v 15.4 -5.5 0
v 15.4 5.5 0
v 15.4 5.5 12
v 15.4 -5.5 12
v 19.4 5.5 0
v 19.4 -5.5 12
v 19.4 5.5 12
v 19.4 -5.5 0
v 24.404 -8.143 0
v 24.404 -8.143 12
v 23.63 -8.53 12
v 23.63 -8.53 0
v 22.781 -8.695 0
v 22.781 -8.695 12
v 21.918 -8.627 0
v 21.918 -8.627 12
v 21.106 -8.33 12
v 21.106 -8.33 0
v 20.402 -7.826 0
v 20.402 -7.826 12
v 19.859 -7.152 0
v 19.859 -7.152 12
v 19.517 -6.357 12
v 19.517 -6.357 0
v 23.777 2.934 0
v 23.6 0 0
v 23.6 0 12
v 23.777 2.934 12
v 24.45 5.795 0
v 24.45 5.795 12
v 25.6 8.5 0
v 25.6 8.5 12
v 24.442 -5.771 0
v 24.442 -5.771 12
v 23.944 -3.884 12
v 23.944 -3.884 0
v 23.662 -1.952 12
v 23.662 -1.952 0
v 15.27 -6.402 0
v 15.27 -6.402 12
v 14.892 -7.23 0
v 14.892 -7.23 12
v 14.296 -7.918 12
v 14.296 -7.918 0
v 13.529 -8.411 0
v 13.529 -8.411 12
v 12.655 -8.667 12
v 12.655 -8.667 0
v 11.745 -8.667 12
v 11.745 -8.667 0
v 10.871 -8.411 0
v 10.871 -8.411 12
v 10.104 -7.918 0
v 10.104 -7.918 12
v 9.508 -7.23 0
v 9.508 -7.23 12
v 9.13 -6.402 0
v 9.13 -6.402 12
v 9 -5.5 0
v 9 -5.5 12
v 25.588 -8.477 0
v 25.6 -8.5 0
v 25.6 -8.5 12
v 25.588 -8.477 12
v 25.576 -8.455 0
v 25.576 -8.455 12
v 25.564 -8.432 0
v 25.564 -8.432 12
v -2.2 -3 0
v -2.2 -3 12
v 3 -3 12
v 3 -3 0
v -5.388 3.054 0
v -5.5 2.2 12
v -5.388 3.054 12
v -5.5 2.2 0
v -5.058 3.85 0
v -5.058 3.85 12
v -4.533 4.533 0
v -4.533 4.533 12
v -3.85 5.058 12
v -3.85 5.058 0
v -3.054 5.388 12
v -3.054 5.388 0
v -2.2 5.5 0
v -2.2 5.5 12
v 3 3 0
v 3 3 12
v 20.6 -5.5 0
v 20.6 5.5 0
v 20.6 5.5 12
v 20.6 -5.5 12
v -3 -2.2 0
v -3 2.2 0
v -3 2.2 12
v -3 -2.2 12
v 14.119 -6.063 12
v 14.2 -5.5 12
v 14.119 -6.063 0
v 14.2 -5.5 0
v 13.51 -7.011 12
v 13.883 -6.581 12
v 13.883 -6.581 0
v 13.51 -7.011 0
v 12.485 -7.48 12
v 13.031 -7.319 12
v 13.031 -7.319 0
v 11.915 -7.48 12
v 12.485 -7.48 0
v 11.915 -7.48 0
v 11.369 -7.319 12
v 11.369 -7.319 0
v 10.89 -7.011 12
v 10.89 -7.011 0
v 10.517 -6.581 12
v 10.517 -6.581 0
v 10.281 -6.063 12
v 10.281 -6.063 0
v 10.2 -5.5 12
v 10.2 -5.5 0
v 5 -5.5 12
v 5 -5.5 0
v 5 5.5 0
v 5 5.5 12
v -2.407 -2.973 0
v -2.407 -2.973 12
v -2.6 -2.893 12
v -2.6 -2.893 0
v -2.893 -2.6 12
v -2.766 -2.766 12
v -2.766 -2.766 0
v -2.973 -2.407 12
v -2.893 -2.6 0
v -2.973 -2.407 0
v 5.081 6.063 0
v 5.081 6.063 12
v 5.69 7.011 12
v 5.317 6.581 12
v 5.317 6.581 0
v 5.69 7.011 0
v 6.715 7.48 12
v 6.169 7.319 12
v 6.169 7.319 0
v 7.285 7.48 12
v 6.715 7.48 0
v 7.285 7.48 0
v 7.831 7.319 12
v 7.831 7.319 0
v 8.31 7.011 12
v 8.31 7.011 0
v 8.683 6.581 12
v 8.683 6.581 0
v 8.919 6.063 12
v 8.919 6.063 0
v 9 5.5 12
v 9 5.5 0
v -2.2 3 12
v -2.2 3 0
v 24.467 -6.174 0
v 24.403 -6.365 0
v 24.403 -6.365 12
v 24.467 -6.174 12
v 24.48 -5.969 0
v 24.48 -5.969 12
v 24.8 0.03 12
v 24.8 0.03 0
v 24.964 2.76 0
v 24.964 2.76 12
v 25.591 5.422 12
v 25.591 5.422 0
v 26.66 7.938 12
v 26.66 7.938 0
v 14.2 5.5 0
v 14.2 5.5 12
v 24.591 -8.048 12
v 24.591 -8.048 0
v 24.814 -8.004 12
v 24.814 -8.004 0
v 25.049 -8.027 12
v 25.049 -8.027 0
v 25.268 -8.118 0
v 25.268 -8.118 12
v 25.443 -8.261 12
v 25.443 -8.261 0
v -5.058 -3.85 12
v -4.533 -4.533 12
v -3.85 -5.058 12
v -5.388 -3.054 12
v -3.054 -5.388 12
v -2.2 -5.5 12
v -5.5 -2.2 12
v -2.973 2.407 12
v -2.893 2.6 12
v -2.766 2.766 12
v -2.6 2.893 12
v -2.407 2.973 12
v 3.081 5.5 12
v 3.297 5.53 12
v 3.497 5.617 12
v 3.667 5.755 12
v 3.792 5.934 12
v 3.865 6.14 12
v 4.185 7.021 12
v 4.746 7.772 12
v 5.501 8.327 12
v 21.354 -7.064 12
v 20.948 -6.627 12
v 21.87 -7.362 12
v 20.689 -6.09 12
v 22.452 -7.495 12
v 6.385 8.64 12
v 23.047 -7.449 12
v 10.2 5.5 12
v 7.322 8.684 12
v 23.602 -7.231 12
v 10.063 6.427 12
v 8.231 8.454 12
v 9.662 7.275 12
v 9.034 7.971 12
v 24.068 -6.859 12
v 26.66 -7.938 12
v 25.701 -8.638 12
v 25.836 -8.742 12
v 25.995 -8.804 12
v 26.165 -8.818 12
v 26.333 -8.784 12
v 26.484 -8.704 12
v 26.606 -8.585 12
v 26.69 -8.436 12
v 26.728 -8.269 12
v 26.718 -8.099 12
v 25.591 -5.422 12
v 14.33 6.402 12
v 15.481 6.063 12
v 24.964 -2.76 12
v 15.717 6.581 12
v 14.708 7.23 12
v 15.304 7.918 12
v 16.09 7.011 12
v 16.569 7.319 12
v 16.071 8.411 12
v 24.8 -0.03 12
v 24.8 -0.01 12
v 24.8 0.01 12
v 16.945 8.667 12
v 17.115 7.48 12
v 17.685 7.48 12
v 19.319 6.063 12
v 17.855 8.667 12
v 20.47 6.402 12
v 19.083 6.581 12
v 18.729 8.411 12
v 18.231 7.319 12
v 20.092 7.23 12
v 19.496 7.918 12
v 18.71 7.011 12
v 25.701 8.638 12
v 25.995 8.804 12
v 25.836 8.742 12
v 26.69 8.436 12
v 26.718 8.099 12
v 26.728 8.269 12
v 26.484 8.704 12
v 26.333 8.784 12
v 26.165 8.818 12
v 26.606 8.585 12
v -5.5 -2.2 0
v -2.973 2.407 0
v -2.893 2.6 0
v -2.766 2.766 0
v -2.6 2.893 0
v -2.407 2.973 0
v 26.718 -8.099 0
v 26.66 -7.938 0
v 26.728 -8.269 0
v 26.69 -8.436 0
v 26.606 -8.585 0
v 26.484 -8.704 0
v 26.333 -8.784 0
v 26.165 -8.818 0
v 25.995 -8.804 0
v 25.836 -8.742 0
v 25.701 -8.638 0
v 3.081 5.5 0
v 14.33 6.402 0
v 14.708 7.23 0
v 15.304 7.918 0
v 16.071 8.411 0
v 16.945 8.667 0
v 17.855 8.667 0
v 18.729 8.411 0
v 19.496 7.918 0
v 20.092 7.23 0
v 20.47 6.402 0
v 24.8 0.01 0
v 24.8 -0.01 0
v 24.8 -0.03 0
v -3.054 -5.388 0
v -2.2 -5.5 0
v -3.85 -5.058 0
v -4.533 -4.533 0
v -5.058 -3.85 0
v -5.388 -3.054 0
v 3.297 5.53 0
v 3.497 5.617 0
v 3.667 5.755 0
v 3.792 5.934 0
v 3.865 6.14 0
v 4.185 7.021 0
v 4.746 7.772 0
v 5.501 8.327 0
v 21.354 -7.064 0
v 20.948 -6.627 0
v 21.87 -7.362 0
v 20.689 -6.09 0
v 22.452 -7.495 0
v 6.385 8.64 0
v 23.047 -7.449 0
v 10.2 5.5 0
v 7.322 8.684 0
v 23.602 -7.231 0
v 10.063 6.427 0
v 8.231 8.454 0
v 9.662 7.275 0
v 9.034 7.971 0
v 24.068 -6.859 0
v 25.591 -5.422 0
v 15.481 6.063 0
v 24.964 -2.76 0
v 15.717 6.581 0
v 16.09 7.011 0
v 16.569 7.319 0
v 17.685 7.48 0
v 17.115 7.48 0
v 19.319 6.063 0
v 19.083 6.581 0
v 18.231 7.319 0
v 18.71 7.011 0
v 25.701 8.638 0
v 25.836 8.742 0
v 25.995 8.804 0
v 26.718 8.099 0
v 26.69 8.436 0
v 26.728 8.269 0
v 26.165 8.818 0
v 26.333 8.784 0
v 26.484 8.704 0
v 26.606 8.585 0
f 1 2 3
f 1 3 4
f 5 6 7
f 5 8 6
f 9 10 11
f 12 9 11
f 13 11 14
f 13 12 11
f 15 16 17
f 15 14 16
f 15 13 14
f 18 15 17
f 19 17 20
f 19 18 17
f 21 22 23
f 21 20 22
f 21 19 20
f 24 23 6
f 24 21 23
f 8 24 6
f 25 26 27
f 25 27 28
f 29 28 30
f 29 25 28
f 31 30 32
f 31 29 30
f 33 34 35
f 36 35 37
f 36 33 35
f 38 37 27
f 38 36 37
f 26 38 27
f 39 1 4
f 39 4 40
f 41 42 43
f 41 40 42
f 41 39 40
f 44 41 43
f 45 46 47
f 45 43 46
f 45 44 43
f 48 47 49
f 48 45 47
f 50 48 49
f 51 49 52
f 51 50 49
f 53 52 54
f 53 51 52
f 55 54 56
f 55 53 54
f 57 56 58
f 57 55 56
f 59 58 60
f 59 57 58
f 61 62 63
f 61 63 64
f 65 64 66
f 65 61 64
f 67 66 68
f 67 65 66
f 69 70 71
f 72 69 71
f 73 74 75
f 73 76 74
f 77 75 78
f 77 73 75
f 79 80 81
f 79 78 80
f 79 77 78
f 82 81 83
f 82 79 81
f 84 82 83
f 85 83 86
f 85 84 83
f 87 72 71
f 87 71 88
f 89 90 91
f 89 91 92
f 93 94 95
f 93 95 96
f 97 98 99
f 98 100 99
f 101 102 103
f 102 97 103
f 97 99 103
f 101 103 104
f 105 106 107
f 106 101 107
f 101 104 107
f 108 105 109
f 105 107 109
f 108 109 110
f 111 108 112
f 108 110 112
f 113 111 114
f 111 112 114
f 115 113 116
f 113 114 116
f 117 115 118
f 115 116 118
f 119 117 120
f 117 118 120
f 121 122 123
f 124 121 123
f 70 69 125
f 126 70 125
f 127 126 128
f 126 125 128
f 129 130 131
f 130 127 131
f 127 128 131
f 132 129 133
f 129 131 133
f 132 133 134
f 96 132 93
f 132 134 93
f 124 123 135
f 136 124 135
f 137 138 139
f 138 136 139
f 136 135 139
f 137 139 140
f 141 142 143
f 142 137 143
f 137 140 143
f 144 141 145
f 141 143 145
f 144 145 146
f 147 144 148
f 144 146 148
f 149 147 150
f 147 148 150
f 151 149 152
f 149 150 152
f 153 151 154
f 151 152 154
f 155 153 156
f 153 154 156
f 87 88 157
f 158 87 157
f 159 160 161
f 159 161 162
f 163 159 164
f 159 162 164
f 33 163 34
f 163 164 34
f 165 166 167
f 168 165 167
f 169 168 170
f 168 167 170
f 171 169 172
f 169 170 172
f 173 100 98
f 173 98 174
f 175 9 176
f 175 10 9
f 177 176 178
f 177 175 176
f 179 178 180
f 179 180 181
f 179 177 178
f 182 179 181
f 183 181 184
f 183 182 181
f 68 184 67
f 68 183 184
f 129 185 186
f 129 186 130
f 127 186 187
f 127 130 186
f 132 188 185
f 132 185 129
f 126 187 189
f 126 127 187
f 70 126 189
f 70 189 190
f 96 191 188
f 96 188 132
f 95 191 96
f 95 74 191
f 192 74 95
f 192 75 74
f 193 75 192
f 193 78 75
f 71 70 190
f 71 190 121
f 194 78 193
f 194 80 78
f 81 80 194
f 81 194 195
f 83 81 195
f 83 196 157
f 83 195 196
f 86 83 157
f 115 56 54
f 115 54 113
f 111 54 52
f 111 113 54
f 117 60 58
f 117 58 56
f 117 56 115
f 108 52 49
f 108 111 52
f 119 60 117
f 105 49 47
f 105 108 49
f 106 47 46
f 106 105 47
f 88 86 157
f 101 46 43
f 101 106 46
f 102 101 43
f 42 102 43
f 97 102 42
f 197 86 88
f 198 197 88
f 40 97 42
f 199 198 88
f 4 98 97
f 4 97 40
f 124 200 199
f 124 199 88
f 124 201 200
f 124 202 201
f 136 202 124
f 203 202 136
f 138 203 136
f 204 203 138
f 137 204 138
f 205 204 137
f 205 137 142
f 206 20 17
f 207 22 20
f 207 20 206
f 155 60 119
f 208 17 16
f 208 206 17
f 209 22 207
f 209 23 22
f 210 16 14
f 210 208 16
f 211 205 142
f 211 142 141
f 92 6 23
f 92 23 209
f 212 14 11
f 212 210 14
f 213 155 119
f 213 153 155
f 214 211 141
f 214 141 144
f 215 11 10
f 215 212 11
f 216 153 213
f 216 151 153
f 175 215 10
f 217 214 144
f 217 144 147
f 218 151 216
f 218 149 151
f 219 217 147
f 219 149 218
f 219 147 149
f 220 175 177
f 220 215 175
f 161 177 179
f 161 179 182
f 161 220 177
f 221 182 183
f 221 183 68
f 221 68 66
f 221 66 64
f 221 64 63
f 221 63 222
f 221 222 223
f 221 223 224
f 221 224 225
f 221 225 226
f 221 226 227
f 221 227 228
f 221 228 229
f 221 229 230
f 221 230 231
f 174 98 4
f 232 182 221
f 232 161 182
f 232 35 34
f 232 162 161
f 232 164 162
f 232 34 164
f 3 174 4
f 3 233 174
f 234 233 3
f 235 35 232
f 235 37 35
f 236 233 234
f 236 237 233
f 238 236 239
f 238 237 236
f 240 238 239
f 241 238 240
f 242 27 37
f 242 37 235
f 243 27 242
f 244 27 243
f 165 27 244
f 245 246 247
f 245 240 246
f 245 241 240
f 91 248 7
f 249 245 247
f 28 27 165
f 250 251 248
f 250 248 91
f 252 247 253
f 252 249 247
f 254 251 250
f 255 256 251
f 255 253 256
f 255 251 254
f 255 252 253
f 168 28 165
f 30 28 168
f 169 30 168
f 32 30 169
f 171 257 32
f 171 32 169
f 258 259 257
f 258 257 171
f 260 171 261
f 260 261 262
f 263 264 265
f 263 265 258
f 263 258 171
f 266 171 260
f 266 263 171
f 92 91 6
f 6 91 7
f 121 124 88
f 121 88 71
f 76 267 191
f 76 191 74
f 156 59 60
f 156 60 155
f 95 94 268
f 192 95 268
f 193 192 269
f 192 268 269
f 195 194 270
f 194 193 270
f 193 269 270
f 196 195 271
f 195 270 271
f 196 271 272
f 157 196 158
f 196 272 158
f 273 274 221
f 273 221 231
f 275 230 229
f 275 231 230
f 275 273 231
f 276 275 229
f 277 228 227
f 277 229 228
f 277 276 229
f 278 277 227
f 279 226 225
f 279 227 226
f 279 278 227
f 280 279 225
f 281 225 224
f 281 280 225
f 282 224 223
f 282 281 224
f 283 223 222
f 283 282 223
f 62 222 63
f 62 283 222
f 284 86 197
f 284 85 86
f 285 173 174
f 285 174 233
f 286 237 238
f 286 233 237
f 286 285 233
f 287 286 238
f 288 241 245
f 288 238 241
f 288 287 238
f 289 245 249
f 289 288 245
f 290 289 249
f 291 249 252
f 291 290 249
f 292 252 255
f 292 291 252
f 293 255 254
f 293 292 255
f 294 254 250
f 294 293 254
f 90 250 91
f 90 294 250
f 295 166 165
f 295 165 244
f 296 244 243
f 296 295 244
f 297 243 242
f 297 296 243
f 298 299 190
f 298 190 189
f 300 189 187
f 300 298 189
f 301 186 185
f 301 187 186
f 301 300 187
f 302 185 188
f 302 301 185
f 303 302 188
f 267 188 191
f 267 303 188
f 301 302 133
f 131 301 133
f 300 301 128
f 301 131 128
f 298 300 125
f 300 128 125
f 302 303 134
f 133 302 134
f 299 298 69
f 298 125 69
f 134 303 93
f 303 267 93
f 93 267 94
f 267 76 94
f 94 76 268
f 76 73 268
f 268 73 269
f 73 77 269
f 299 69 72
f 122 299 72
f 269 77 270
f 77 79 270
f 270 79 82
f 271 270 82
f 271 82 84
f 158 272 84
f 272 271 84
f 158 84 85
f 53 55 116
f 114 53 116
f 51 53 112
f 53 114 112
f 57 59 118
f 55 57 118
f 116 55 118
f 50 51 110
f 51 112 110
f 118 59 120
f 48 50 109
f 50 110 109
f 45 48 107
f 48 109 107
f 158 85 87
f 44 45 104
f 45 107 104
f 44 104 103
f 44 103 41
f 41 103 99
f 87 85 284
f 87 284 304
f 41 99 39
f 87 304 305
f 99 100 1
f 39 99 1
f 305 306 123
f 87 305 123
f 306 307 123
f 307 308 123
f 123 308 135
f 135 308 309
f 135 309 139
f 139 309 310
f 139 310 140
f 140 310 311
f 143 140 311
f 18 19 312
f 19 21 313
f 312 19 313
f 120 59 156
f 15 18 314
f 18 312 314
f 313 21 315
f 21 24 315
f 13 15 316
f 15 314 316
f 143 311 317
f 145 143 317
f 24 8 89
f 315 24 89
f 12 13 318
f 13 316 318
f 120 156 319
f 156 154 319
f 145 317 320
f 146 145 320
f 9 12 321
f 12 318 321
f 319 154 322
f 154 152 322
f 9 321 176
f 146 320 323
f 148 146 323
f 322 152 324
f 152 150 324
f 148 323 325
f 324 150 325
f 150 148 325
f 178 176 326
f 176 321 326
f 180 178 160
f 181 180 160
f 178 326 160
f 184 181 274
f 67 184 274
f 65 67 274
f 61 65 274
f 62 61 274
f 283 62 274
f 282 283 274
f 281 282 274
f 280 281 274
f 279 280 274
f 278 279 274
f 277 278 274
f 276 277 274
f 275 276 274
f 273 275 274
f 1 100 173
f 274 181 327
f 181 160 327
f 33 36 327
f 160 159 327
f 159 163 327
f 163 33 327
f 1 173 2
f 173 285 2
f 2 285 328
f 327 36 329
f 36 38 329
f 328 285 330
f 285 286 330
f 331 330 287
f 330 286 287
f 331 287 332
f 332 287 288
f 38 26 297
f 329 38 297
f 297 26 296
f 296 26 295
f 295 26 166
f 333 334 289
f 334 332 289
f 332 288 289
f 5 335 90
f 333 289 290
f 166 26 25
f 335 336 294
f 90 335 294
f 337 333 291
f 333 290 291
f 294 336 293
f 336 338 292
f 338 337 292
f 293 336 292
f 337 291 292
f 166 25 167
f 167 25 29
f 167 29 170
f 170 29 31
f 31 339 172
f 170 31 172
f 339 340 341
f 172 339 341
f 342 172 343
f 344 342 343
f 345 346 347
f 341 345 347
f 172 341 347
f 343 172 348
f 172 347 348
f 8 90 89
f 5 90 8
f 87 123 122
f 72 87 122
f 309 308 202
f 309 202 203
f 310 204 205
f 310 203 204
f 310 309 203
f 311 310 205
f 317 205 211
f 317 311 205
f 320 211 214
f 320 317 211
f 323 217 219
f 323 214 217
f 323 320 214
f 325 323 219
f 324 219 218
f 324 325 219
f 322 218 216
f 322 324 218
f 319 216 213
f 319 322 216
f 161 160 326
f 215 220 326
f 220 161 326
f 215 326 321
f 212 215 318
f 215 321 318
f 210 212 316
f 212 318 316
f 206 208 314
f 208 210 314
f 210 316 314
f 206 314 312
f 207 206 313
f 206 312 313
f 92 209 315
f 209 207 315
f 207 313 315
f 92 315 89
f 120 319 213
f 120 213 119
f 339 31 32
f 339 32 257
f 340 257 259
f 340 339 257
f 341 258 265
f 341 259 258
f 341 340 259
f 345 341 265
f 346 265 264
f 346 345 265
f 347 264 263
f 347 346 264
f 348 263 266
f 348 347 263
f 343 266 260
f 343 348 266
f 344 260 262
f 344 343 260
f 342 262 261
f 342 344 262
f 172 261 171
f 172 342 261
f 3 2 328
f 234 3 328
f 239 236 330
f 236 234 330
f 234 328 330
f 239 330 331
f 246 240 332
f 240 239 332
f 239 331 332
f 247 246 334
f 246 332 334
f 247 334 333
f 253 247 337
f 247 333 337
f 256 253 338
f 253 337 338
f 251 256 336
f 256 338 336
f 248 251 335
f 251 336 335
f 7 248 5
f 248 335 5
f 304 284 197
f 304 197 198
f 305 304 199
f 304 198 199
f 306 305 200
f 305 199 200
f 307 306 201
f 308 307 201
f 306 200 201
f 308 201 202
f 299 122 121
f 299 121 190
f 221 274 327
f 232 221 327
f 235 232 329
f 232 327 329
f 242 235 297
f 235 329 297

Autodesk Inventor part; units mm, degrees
ref_plane "YZ Plane" through (0, 0, 0) normal (1, 0, 0) x (0, 1, 0)
ref_plane "XZ Plane" through (0, 0, 0) normal (0, 1, 0) x (-1, 0, 0)
ref_plane "XY Plane" through (0, 0, 0) normal (0, 0, 1) x (1, 0, 0)
sketch "Boceto1" plane through (0, 0, 0) normal (0, 0, 1) x (1, 0, 0)
  line L0 (3, -11.4) -> (3, -5.5)
  line L1 (3, -5.5) -> (-2.2, -5.5)
  arc A0 (-5.5, -2.2) -> (-2.2, -5.5) centre (-2.2, -2.2) ccw
  line L2 (-5.5, -2.2) -> (-5.5, 2.2)
  arc A1 (-2.2, 5.5) -> (-5.5, 2.2) centre (-2.2, 2.2) ccw
  line L3 (-2.2, 5.5) -> (3, 5.5)
  line L4 (3, 5.5) -> (3, 11.4)
  line L5 (3, 3) -> (-2.2, 3)
  arc A2 (-2.2, 3) -> (-3, 2.2) centre (-2.2, 2.2) ccw
  line L6 (-3, 2.2) -> (-3, -2.2)
  arc A3 (-3, -2.2) -> (-2.2, -3) centre (-2.2, -2.2) ccw
  line L7 (-2.2, -3) -> (3, -3)
  line L8 (3, -3) -> (3, 3)
  line L9 (-2.2, 3.25) -> (3.25, 3.25)
  line L10 (3.25, 3.25) -> (3.25, -3.25)
  line L11 (3.25, -3.25) -> (-2.2, -3.25)
  arc A4 (-3.25, -2.2) -> (-2.2, -3.25) centre (-2.2, -2.2) ccw
  line L12 (-3.25, -2.2) -> (-3.25, 2.2)
  arc A5 (-2.2, 3.25) -> (-3.25, 2.2) centre (-2.2, 2.2) ccw
  line L13 (-2.2, 5) -> (5, 5)
  line L14 (5, 5) -> (5, -5)
  line L15 (5, -5) -> (-2.2, -5)
  arc A6 (-5, -2.2) -> (-2.2, -5) centre (-2.2, -2.2) ccw
  line L16 (-5, -2.2) -> (-5, 2.2)
  arc A7 (-2.2, 5) -> (-5, 2.2) centre (-2.2, 2.2) ccw
  line L17 (23.6, 0) -> (22.4, 0)
  arc A8 (25.6, 8.5) -> (23.6, 0) centre (40.821, 0.4333) ccw
  circle A9 centre (23.6, 0) radius 1.2
  arc A10 (26.6603, 7.9381) -> (24.7996, 0.0302) centre (40.821, 0.4333) ccw
  line L18 (25.6, 8.5) -> (25.9736, 8.302)
  arc A11 (26.6603, 7.9381) -> (25.6, 8.5) centre (26.1301, 8.219) ccw
  arc A12 (23.6, 0) -> (25.6, -8.5) centre (40.821, -0.4333) ccw
  arc A13 (24.7996, -0.0302) -> (26.6603, -7.9381) centre (40.821, -0.4333) ccw
  line L19 (25.9736, -8.302) -> (26.6603, -7.9381)
  arc A14 (25.6, -8.5) -> (26.6603, -7.9381) centre (26.1301, -8.219) ccw
  line L20 (3, -5.5) -> (5, -5.5)
  line L21 (5, -5.5) -> (5, -5)
  line L22 (3, 5.5) -> (5, 5.5)
  line L23 (5, 5) -> (5, 5.5)
  line L24 (5, 5.5) -> (7, 5.5)
  line L25 (9, 5.5) -> (10.2, 5.5)
  line L26 (10.2, 5.5) -> (10.2, -5.5)
  line L27 (10.2, -5.5) -> (9, -5.5)
  line L28 (9, -5.5) -> (9, 5.5)
  line L29 (10.2, -5.5) -> (12.2, -5.5)
  arc A15 (10.2, 5.5) -> (3.8, 5.5) centre (7, 5.5) ccw
  arc A16 (9, 5.5) -> (5, 5.5) centre (7, 5.5) ccw
  line L30 (15.4, -5.5) -> (14.2, -5.5)
  line L31 (14.2, -5.5) -> (14.2, 5.5)
  line L32 (14.2, 5.5) -> (15.4, 5.5)
  line L33 (15.4, 5.5) -> (15.4, -5.5)
  arc A17 (10.2, -5.5) -> (14.2, -5.5) centre (12.2, -5.5) ccw
  arc A18 (9, -5.5) -> (15.4, -5.5) centre (12.2, -5.5) ccw
  line L34 (19.4, 5.5) -> (20.6, 5.5)
  line L35 (20.6, 5.5) -> (20.6, -5.5)
  line L36 (20.6, -5.5) -> (19.4, -5.5)
  line L37 (19.4, -5.5) -> (19.4, 5.5)
  line L38 (20.6, -5.5) -> (22.6, -5.5)
  arc A19 (20.6, 5.5) -> (14.2, 5.5) centre (17.4, 5.5) ccw
  arc A20 (19.4, 5.5) -> (15.4, 5.5) centre (17.4, 5.5) ccw
  arc A21 (20.6, -5.5) -> (24.5287, -6.0291) centre (22.6, -5.5) ccw
  arc A22 (19.4, -5.5) -> (25.1061, -7.4898) centre (22.6, -5.5) ccw
  point P0 (0, 0)
  point P1 (4.2, -5)
  point P2 (3.8, 5)
  point P3 (23, 0)
  point P4 (23.6116, -1.1999)
  point P5 (24.7996, 0.0302)
  point P6 (23.6116, 1.1999)
  dimension "d1" = 0.25
  dimension "d2" = 2
  dimension "d41" = 1.2
  dimension "d44" = 2
  dimension "d46" = 11
  dimension "d47" = 2
  dimension "d48" = 1.2
  dimension "d49" = 11
  dimension "d50" = 11
  dimension "d51" = 2
extrude "Extrusión1" add sketch "Boceto1" along normal blind 12 contours L1 A0 L2 A1 L3 L22 L23 L13 A7 L16 A6 L15 L21 L20 | L15 A6 L16 A7 L13 L14 | L22 A15 L25 A16 | L25 L26 L27 L28 | L27 A17 L30 A18 | L30 L31 L32 L33 | L32 A19 L34 A20 | L34 L35 L36 L37 | L36 A21 A12 A22 | A12 A9 A13 A14 | A12 A8 A9 | A8 A11 A10 A9 | L9 L10 L11 A4 L12 A5
fillet "Empalme1" radius 0.8 3 edges at (3.8, 5.5, 6) (25.1061, -7.4898, 6) (24.5287, -6.0291, 6)
properties part number "_3DPrint"
